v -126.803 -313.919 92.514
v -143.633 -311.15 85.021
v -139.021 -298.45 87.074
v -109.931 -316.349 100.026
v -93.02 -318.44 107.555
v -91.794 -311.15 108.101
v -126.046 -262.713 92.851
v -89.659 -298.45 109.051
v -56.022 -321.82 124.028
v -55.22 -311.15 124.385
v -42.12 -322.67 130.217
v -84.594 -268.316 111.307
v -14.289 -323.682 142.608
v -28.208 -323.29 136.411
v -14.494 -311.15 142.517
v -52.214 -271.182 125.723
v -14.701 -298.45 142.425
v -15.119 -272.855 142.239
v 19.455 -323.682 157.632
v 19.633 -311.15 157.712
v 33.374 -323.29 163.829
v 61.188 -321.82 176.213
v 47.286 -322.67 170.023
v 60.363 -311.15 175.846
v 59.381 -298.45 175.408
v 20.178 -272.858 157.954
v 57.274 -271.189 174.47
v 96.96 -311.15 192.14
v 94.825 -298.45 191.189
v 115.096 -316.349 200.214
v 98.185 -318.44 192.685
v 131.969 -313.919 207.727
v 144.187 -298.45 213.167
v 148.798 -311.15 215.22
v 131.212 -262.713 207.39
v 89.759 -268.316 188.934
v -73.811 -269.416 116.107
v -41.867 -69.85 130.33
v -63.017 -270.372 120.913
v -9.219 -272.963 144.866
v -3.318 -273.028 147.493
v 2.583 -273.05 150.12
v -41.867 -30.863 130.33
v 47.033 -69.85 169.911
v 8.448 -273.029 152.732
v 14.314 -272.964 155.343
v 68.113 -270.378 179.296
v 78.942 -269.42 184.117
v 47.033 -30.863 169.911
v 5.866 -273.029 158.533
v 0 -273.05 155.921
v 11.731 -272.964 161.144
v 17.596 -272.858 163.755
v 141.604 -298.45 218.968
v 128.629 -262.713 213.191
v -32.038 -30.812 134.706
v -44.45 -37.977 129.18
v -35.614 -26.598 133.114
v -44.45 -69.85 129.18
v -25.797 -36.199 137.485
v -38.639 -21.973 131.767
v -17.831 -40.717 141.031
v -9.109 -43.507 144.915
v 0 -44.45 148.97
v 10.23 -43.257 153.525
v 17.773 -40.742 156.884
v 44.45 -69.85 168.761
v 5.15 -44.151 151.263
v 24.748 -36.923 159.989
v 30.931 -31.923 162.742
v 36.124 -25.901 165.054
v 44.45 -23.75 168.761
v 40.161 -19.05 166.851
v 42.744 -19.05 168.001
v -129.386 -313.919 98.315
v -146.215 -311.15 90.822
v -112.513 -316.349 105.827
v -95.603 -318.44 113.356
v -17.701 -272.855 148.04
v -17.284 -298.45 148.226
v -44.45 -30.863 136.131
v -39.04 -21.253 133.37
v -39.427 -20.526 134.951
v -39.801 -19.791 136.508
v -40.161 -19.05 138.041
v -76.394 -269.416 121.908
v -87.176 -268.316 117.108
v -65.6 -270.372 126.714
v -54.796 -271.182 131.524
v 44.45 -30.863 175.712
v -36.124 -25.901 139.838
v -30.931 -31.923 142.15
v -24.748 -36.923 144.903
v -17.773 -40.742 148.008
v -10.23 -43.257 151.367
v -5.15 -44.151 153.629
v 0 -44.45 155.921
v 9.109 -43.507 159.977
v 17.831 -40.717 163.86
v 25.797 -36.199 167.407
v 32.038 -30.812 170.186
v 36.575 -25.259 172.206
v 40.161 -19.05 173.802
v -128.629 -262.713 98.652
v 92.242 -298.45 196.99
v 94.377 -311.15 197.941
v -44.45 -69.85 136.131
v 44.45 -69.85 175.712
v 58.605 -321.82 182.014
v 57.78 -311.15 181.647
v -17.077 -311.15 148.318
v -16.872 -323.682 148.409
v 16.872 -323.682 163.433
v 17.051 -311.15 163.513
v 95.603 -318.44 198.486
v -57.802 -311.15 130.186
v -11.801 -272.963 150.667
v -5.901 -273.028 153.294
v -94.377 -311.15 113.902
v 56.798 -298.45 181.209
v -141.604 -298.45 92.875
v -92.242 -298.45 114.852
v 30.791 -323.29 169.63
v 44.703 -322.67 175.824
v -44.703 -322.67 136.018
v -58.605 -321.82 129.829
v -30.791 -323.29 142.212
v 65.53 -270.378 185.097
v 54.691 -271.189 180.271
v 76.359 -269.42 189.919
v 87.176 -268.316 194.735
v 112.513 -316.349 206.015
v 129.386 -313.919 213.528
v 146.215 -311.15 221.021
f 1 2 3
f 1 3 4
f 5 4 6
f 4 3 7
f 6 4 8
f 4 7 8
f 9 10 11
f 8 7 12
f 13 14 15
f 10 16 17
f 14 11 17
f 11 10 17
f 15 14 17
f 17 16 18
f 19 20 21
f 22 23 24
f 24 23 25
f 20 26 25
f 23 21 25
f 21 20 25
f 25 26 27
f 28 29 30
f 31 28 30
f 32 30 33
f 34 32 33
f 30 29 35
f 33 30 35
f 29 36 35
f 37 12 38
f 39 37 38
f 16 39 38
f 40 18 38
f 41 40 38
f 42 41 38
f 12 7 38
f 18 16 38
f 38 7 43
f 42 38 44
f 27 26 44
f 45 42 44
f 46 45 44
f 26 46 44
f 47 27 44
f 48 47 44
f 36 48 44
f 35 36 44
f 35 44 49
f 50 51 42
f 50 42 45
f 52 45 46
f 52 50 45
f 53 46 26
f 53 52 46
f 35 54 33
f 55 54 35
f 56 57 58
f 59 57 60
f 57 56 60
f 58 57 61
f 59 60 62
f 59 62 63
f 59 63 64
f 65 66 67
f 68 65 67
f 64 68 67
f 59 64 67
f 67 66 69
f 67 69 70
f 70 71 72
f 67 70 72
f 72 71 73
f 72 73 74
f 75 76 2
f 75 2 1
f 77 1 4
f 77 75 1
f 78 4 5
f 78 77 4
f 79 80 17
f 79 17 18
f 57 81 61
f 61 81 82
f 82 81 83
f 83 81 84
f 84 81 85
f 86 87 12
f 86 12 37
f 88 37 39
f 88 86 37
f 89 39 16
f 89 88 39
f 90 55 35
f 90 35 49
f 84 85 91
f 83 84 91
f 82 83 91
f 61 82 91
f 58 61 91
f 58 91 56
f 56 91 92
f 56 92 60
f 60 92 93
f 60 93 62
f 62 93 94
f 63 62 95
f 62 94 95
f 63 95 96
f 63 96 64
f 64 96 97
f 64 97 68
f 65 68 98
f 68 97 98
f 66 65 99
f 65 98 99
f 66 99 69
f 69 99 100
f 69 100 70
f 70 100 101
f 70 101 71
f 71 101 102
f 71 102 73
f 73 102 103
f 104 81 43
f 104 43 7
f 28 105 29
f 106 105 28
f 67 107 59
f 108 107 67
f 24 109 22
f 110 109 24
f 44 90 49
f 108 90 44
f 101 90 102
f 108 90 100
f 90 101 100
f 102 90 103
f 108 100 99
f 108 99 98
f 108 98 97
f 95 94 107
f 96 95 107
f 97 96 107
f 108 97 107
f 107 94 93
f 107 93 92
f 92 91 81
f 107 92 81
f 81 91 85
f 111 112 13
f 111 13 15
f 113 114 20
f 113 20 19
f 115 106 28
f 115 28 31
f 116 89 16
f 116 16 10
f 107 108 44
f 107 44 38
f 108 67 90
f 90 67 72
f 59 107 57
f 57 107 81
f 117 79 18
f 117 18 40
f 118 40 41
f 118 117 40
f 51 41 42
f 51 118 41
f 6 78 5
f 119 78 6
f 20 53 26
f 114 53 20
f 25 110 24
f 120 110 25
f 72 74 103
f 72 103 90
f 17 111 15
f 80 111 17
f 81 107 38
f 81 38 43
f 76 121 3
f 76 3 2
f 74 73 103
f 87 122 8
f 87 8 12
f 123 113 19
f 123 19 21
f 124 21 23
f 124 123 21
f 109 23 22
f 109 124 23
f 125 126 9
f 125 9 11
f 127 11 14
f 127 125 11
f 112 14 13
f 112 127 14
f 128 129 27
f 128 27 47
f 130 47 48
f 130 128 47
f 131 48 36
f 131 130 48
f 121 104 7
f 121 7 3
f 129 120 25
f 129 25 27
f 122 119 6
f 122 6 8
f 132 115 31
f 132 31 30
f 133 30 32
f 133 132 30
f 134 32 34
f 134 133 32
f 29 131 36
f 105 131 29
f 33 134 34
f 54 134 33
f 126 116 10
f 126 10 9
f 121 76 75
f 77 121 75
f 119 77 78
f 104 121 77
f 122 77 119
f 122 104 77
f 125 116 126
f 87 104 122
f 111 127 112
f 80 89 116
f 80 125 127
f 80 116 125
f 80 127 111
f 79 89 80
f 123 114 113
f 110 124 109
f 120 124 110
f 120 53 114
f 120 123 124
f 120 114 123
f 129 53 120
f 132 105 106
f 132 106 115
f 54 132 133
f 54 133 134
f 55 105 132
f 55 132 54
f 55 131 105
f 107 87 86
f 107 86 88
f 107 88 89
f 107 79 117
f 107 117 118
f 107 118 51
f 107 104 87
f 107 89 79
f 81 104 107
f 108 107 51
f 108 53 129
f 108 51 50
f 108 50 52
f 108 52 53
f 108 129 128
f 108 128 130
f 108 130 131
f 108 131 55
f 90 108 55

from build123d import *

# Parameters (mm, degrees)
F0_R      = 44.45
F1_DEPTH  = 254
F4_DEPTH  = 25.4
F5_DEPTH  = 25.4
F6_DEPTH  = 254
F8_DEPTH  = 6.35
F10_DEPTH = 6.35
F12_DEPTH = 6.35


with BuildPart() as f1:
    # F0 (on Top) → F1 (new body)
    with BuildSketch(Plane.XY):
        Circle(F0_R)
    extrude(amount=F1_DEPTH)

    # F3 (on offset) → F4 (join)
    with BuildSketch(Plane.XZ.offset(44.45)):
        Polygon((-44.45, 136.1308991909), (-44.45, 129.1799588224), (44.45, 168.7607889463), (44.45, 175.7117293148), align=None)
    extrude(amount=-F4_DEPTH)

    # F5 (add): a face of the model
    f5_faces = [f1.faces().sort_by_distance(p)[0] for p in [
        (0, -44.45, 152.4458440686),
    ]]
    extrude(f5_faces, amount=F5_DEPTH)

    # F6 (cut): a face of the model
    f6_faces = [f1.faces().sort_by_distance(p)[0] for p in [
        (0, 0, 254),
    ]]
    extrude(f6_faces, amount=-F6_DEPTH, mode=Mode.SUBTRACT)

    # F9 (on face) → F10 (cut)
    with BuildSketch(Plane(origin=(-57.9360589343, 0, 130.1265189016), x_dir=(0.9135454576, 0, 0.4067366431), z_dir=(-0.4067366431, 0, 0.9135454576))):
        Polygon((14.7623293636, -30.8631713137), (19.4573050542, -19.05), (22.8378735483, -15.4172629118), (-1.8812613562, -15.4172629118), (4.7252961137, -56.1176563369), align=None)
    extrude(amount=-F10_DEPTH, mode=Mode.SUBTRACT)

    # F11 (on face) → F12 (cut)
    with BuildSketch(Plane(origin=(-57.9360589343, 0, 130.1265189016), x_dir=(0.9135454576, 0, 0.4067366431), z_dir=(-0.4067366431, 0, 0.9135454576))):
        Polygon((107.3805188322, -7.569919806), (107.3805188322, -19.05), (112.0754945228, -30.8631713137), (116.4021759315, -41.7496661689), (130.1503181458, -10.120306164), align=None)
    extrude(amount=-F12_DEPTH, mode=Mode.SUBTRACT)


with BuildPart() as f8:
    # F7 (on face) → F8 (new body)
    with BuildSketch(Plane(origin=(-57.9360589343, 0, 130.1265189016), x_dir=(0.9135454576, 0, 0.4067366431), z_dir=(-0.4067366431, 0, 0.9135454576))):
        with BuildLine():
            Line((112.0754945228, -69.85), (63.4189119432, -69.85))
            Line((63.4189119432, -69.85), (63.4189119432, -273.05))
            ThreePointArc((63.4189119432, -273.05), (73.0497599715, -273.0018945868), (82.6796468911, -272.8575831478))
            ThreePointArc((82.6796468911, -272.8575831478), (102.9913126824, -272.2375027613), (123.2853969647, -271.1894521687))
            ThreePointArc((123.2853969647, -271.1894521687), (141.0786911629, -269.9170563468), (158.8453969647, -268.3156586744))
            ThreePointArc((158.8453969647, -268.3156586744), (181.566308316, -265.7832168467), (204.2207833172, -262.7127385999))
            Line((204.2207833172, -262.7127385999), (112.0754945228, -30.8631713137))
            Line((112.0754945228, -30.8631713137), (112.0754945228, -69.85))
        make_face()
        with BuildLine():
            Line((63.4189119432, -273.05), (63.4189119432, -69.85))
            Line((63.4189119432, -69.85), (14.7623293636, -69.85))
            Line((14.7623293636, -69.85), (14.7623293636, -30.8631713137))
            Line((14.7623293636, -30.8631713137), (-77.3829594308, -262.7127385999))
            ThreePointArc((-77.3829594308, -262.7127385999), (-54.7284844296, -265.7832168467), (-32.0075730783, -268.3156586744))
            ThreePointArc((-32.0075730783, -268.3156586744), (-14.2986557796, -269.9123844003), (3.4366970323, -271.182244854))
            ThreePointArc((3.4366970323, -271.182244854), (23.7306551151, -272.2327362807), (44.0422461801, -272.8552596191))
            ThreePointArc((44.0422461801, -272.8552596191), (53.7300897765, -273.0013136754), (63.4189119432, -273.05))
        make_face()
        with BuildLine():
            ThreePointArc((-32.0075730783, -268.3156586744), (-54.7284844296, -265.7832168467), (-77.3829594308, -262.7127385999))
            Line((-77.3829594308, -262.7127385999), (-91.5862219642, -298.45))
            Line((-91.5862219642, -298.45), (-37.5527486202, -298.45))
            Line((-37.5527486202, -298.45), (-32.0075730783, -268.3156586744))
        make_face()
        Polygon((-37.5527486202, -298.45), (-91.5862219642, -298.45), (-96.6336550105, -311.15), (-39.8897411106, -311.15), align=None)
        with BuildLine():
            Line((-39.8897411106, -311.15), (-96.6336550105, -311.15))
            ThreePointArc((-96.6336550105, -311.15), (-68.9826239746, -315.1764194064), (-41.2312253973, -318.4400749618))
            Line((-41.2312253973, -318.4400749618), (-39.8897411106, -311.15))
        make_face()
        with BuildLine():
            Line((44.4993785514, -298.45), (44.0422461801, -272.8552596191))
            ThreePointArc((44.0422461801, -272.8552596191), (23.7306551151, -272.2327362807), (3.4366970323, -271.182244854))
            Line((3.4366970323, -271.182244854), (1.1918987261, -298.45))
            Line((1.1918987261, -298.45), (44.4993785514, -298.45))
        make_face()
        Polygon((44.7262056662, -311.15), (44.4993785514, -298.45), (1.1918987261, -298.45), (0.1463803717, -311.15), align=None)
        with BuildLine():
            Line((44.9500311248, -323.6819379349), (44.7262056662, -311.15))
            Line((44.7262056662, -311.15), (0.1463803717, -311.15))
            Line((0.1463803717, -311.15), (-0.7320591448, -321.8204792056))
            ThreePointArc((-0.7320591448, -321.8204792056), (22.0985024655, -323.0084849242), (44.9500311248, -323.6819379349))
        make_face()
        with BuildLine():
            ThreePointArc((123.2853969647, -271.1894521687), (102.9913126824, -272.2375027613), (82.6796468911, -272.8575831478))
            Line((82.6796468911, -272.8575831478), (82.2809116577, -298.45))
            Line((82.2809116577, -298.45), (125.5922322035, -298.45))
            Line((125.5922322035, -298.45), (123.2853969647, -271.1894521687))
        make_face()
        Polygon((125.5922322035, -298.45), (82.2809116577, -298.45), (82.0830429885, -311.15), (126.666928417, -311.15), align=None)
        with BuildLine():
            Line((126.666928417, -311.15), (82.0830429885, -311.15))
            Line((82.0830429885, -311.15), (81.8877927615, -323.6819379349))
            ThreePointArc((81.8877927615, -323.6819379349), (104.7393214209, -323.0084849242), (127.5698830311, -321.8204792056))
            Line((127.5698830311, -321.8204792056), (126.666928417, -311.15))
        make_face()
        with BuildLine():
            Line((218.4240458506, -298.45), (204.2207833172, -262.7127385999))
            ThreePointArc((204.2207833172, -262.7127385999), (181.566308316, -265.7832168467), (158.8453969647, -268.3156586744))
            Line((158.8453969647, -268.3156586744), (164.3905725066, -298.45))
            Line((164.3905725066, -298.45), (218.4240458506, -298.45))
        make_face()
        Polygon((223.4714788969, -311.15), (218.4240458506, -298.45), (164.3905725066, -298.45), (166.727564997, -311.15), align=None)
        with BuildLine():
            ThreePointArc((168.0690492836, -318.4400749618), (195.820447861, -315.1764194064), (223.4714788969, -311.15))
            Line((223.4714788969, -311.15), (166.727564997, -311.15))
            Line((166.727564997, -311.15), (168.0690492836, -318.4400749618))
        make_face()
    extrude(amount=-F8_DEPTH)


solid = Compound([f1.part, f8.part])
